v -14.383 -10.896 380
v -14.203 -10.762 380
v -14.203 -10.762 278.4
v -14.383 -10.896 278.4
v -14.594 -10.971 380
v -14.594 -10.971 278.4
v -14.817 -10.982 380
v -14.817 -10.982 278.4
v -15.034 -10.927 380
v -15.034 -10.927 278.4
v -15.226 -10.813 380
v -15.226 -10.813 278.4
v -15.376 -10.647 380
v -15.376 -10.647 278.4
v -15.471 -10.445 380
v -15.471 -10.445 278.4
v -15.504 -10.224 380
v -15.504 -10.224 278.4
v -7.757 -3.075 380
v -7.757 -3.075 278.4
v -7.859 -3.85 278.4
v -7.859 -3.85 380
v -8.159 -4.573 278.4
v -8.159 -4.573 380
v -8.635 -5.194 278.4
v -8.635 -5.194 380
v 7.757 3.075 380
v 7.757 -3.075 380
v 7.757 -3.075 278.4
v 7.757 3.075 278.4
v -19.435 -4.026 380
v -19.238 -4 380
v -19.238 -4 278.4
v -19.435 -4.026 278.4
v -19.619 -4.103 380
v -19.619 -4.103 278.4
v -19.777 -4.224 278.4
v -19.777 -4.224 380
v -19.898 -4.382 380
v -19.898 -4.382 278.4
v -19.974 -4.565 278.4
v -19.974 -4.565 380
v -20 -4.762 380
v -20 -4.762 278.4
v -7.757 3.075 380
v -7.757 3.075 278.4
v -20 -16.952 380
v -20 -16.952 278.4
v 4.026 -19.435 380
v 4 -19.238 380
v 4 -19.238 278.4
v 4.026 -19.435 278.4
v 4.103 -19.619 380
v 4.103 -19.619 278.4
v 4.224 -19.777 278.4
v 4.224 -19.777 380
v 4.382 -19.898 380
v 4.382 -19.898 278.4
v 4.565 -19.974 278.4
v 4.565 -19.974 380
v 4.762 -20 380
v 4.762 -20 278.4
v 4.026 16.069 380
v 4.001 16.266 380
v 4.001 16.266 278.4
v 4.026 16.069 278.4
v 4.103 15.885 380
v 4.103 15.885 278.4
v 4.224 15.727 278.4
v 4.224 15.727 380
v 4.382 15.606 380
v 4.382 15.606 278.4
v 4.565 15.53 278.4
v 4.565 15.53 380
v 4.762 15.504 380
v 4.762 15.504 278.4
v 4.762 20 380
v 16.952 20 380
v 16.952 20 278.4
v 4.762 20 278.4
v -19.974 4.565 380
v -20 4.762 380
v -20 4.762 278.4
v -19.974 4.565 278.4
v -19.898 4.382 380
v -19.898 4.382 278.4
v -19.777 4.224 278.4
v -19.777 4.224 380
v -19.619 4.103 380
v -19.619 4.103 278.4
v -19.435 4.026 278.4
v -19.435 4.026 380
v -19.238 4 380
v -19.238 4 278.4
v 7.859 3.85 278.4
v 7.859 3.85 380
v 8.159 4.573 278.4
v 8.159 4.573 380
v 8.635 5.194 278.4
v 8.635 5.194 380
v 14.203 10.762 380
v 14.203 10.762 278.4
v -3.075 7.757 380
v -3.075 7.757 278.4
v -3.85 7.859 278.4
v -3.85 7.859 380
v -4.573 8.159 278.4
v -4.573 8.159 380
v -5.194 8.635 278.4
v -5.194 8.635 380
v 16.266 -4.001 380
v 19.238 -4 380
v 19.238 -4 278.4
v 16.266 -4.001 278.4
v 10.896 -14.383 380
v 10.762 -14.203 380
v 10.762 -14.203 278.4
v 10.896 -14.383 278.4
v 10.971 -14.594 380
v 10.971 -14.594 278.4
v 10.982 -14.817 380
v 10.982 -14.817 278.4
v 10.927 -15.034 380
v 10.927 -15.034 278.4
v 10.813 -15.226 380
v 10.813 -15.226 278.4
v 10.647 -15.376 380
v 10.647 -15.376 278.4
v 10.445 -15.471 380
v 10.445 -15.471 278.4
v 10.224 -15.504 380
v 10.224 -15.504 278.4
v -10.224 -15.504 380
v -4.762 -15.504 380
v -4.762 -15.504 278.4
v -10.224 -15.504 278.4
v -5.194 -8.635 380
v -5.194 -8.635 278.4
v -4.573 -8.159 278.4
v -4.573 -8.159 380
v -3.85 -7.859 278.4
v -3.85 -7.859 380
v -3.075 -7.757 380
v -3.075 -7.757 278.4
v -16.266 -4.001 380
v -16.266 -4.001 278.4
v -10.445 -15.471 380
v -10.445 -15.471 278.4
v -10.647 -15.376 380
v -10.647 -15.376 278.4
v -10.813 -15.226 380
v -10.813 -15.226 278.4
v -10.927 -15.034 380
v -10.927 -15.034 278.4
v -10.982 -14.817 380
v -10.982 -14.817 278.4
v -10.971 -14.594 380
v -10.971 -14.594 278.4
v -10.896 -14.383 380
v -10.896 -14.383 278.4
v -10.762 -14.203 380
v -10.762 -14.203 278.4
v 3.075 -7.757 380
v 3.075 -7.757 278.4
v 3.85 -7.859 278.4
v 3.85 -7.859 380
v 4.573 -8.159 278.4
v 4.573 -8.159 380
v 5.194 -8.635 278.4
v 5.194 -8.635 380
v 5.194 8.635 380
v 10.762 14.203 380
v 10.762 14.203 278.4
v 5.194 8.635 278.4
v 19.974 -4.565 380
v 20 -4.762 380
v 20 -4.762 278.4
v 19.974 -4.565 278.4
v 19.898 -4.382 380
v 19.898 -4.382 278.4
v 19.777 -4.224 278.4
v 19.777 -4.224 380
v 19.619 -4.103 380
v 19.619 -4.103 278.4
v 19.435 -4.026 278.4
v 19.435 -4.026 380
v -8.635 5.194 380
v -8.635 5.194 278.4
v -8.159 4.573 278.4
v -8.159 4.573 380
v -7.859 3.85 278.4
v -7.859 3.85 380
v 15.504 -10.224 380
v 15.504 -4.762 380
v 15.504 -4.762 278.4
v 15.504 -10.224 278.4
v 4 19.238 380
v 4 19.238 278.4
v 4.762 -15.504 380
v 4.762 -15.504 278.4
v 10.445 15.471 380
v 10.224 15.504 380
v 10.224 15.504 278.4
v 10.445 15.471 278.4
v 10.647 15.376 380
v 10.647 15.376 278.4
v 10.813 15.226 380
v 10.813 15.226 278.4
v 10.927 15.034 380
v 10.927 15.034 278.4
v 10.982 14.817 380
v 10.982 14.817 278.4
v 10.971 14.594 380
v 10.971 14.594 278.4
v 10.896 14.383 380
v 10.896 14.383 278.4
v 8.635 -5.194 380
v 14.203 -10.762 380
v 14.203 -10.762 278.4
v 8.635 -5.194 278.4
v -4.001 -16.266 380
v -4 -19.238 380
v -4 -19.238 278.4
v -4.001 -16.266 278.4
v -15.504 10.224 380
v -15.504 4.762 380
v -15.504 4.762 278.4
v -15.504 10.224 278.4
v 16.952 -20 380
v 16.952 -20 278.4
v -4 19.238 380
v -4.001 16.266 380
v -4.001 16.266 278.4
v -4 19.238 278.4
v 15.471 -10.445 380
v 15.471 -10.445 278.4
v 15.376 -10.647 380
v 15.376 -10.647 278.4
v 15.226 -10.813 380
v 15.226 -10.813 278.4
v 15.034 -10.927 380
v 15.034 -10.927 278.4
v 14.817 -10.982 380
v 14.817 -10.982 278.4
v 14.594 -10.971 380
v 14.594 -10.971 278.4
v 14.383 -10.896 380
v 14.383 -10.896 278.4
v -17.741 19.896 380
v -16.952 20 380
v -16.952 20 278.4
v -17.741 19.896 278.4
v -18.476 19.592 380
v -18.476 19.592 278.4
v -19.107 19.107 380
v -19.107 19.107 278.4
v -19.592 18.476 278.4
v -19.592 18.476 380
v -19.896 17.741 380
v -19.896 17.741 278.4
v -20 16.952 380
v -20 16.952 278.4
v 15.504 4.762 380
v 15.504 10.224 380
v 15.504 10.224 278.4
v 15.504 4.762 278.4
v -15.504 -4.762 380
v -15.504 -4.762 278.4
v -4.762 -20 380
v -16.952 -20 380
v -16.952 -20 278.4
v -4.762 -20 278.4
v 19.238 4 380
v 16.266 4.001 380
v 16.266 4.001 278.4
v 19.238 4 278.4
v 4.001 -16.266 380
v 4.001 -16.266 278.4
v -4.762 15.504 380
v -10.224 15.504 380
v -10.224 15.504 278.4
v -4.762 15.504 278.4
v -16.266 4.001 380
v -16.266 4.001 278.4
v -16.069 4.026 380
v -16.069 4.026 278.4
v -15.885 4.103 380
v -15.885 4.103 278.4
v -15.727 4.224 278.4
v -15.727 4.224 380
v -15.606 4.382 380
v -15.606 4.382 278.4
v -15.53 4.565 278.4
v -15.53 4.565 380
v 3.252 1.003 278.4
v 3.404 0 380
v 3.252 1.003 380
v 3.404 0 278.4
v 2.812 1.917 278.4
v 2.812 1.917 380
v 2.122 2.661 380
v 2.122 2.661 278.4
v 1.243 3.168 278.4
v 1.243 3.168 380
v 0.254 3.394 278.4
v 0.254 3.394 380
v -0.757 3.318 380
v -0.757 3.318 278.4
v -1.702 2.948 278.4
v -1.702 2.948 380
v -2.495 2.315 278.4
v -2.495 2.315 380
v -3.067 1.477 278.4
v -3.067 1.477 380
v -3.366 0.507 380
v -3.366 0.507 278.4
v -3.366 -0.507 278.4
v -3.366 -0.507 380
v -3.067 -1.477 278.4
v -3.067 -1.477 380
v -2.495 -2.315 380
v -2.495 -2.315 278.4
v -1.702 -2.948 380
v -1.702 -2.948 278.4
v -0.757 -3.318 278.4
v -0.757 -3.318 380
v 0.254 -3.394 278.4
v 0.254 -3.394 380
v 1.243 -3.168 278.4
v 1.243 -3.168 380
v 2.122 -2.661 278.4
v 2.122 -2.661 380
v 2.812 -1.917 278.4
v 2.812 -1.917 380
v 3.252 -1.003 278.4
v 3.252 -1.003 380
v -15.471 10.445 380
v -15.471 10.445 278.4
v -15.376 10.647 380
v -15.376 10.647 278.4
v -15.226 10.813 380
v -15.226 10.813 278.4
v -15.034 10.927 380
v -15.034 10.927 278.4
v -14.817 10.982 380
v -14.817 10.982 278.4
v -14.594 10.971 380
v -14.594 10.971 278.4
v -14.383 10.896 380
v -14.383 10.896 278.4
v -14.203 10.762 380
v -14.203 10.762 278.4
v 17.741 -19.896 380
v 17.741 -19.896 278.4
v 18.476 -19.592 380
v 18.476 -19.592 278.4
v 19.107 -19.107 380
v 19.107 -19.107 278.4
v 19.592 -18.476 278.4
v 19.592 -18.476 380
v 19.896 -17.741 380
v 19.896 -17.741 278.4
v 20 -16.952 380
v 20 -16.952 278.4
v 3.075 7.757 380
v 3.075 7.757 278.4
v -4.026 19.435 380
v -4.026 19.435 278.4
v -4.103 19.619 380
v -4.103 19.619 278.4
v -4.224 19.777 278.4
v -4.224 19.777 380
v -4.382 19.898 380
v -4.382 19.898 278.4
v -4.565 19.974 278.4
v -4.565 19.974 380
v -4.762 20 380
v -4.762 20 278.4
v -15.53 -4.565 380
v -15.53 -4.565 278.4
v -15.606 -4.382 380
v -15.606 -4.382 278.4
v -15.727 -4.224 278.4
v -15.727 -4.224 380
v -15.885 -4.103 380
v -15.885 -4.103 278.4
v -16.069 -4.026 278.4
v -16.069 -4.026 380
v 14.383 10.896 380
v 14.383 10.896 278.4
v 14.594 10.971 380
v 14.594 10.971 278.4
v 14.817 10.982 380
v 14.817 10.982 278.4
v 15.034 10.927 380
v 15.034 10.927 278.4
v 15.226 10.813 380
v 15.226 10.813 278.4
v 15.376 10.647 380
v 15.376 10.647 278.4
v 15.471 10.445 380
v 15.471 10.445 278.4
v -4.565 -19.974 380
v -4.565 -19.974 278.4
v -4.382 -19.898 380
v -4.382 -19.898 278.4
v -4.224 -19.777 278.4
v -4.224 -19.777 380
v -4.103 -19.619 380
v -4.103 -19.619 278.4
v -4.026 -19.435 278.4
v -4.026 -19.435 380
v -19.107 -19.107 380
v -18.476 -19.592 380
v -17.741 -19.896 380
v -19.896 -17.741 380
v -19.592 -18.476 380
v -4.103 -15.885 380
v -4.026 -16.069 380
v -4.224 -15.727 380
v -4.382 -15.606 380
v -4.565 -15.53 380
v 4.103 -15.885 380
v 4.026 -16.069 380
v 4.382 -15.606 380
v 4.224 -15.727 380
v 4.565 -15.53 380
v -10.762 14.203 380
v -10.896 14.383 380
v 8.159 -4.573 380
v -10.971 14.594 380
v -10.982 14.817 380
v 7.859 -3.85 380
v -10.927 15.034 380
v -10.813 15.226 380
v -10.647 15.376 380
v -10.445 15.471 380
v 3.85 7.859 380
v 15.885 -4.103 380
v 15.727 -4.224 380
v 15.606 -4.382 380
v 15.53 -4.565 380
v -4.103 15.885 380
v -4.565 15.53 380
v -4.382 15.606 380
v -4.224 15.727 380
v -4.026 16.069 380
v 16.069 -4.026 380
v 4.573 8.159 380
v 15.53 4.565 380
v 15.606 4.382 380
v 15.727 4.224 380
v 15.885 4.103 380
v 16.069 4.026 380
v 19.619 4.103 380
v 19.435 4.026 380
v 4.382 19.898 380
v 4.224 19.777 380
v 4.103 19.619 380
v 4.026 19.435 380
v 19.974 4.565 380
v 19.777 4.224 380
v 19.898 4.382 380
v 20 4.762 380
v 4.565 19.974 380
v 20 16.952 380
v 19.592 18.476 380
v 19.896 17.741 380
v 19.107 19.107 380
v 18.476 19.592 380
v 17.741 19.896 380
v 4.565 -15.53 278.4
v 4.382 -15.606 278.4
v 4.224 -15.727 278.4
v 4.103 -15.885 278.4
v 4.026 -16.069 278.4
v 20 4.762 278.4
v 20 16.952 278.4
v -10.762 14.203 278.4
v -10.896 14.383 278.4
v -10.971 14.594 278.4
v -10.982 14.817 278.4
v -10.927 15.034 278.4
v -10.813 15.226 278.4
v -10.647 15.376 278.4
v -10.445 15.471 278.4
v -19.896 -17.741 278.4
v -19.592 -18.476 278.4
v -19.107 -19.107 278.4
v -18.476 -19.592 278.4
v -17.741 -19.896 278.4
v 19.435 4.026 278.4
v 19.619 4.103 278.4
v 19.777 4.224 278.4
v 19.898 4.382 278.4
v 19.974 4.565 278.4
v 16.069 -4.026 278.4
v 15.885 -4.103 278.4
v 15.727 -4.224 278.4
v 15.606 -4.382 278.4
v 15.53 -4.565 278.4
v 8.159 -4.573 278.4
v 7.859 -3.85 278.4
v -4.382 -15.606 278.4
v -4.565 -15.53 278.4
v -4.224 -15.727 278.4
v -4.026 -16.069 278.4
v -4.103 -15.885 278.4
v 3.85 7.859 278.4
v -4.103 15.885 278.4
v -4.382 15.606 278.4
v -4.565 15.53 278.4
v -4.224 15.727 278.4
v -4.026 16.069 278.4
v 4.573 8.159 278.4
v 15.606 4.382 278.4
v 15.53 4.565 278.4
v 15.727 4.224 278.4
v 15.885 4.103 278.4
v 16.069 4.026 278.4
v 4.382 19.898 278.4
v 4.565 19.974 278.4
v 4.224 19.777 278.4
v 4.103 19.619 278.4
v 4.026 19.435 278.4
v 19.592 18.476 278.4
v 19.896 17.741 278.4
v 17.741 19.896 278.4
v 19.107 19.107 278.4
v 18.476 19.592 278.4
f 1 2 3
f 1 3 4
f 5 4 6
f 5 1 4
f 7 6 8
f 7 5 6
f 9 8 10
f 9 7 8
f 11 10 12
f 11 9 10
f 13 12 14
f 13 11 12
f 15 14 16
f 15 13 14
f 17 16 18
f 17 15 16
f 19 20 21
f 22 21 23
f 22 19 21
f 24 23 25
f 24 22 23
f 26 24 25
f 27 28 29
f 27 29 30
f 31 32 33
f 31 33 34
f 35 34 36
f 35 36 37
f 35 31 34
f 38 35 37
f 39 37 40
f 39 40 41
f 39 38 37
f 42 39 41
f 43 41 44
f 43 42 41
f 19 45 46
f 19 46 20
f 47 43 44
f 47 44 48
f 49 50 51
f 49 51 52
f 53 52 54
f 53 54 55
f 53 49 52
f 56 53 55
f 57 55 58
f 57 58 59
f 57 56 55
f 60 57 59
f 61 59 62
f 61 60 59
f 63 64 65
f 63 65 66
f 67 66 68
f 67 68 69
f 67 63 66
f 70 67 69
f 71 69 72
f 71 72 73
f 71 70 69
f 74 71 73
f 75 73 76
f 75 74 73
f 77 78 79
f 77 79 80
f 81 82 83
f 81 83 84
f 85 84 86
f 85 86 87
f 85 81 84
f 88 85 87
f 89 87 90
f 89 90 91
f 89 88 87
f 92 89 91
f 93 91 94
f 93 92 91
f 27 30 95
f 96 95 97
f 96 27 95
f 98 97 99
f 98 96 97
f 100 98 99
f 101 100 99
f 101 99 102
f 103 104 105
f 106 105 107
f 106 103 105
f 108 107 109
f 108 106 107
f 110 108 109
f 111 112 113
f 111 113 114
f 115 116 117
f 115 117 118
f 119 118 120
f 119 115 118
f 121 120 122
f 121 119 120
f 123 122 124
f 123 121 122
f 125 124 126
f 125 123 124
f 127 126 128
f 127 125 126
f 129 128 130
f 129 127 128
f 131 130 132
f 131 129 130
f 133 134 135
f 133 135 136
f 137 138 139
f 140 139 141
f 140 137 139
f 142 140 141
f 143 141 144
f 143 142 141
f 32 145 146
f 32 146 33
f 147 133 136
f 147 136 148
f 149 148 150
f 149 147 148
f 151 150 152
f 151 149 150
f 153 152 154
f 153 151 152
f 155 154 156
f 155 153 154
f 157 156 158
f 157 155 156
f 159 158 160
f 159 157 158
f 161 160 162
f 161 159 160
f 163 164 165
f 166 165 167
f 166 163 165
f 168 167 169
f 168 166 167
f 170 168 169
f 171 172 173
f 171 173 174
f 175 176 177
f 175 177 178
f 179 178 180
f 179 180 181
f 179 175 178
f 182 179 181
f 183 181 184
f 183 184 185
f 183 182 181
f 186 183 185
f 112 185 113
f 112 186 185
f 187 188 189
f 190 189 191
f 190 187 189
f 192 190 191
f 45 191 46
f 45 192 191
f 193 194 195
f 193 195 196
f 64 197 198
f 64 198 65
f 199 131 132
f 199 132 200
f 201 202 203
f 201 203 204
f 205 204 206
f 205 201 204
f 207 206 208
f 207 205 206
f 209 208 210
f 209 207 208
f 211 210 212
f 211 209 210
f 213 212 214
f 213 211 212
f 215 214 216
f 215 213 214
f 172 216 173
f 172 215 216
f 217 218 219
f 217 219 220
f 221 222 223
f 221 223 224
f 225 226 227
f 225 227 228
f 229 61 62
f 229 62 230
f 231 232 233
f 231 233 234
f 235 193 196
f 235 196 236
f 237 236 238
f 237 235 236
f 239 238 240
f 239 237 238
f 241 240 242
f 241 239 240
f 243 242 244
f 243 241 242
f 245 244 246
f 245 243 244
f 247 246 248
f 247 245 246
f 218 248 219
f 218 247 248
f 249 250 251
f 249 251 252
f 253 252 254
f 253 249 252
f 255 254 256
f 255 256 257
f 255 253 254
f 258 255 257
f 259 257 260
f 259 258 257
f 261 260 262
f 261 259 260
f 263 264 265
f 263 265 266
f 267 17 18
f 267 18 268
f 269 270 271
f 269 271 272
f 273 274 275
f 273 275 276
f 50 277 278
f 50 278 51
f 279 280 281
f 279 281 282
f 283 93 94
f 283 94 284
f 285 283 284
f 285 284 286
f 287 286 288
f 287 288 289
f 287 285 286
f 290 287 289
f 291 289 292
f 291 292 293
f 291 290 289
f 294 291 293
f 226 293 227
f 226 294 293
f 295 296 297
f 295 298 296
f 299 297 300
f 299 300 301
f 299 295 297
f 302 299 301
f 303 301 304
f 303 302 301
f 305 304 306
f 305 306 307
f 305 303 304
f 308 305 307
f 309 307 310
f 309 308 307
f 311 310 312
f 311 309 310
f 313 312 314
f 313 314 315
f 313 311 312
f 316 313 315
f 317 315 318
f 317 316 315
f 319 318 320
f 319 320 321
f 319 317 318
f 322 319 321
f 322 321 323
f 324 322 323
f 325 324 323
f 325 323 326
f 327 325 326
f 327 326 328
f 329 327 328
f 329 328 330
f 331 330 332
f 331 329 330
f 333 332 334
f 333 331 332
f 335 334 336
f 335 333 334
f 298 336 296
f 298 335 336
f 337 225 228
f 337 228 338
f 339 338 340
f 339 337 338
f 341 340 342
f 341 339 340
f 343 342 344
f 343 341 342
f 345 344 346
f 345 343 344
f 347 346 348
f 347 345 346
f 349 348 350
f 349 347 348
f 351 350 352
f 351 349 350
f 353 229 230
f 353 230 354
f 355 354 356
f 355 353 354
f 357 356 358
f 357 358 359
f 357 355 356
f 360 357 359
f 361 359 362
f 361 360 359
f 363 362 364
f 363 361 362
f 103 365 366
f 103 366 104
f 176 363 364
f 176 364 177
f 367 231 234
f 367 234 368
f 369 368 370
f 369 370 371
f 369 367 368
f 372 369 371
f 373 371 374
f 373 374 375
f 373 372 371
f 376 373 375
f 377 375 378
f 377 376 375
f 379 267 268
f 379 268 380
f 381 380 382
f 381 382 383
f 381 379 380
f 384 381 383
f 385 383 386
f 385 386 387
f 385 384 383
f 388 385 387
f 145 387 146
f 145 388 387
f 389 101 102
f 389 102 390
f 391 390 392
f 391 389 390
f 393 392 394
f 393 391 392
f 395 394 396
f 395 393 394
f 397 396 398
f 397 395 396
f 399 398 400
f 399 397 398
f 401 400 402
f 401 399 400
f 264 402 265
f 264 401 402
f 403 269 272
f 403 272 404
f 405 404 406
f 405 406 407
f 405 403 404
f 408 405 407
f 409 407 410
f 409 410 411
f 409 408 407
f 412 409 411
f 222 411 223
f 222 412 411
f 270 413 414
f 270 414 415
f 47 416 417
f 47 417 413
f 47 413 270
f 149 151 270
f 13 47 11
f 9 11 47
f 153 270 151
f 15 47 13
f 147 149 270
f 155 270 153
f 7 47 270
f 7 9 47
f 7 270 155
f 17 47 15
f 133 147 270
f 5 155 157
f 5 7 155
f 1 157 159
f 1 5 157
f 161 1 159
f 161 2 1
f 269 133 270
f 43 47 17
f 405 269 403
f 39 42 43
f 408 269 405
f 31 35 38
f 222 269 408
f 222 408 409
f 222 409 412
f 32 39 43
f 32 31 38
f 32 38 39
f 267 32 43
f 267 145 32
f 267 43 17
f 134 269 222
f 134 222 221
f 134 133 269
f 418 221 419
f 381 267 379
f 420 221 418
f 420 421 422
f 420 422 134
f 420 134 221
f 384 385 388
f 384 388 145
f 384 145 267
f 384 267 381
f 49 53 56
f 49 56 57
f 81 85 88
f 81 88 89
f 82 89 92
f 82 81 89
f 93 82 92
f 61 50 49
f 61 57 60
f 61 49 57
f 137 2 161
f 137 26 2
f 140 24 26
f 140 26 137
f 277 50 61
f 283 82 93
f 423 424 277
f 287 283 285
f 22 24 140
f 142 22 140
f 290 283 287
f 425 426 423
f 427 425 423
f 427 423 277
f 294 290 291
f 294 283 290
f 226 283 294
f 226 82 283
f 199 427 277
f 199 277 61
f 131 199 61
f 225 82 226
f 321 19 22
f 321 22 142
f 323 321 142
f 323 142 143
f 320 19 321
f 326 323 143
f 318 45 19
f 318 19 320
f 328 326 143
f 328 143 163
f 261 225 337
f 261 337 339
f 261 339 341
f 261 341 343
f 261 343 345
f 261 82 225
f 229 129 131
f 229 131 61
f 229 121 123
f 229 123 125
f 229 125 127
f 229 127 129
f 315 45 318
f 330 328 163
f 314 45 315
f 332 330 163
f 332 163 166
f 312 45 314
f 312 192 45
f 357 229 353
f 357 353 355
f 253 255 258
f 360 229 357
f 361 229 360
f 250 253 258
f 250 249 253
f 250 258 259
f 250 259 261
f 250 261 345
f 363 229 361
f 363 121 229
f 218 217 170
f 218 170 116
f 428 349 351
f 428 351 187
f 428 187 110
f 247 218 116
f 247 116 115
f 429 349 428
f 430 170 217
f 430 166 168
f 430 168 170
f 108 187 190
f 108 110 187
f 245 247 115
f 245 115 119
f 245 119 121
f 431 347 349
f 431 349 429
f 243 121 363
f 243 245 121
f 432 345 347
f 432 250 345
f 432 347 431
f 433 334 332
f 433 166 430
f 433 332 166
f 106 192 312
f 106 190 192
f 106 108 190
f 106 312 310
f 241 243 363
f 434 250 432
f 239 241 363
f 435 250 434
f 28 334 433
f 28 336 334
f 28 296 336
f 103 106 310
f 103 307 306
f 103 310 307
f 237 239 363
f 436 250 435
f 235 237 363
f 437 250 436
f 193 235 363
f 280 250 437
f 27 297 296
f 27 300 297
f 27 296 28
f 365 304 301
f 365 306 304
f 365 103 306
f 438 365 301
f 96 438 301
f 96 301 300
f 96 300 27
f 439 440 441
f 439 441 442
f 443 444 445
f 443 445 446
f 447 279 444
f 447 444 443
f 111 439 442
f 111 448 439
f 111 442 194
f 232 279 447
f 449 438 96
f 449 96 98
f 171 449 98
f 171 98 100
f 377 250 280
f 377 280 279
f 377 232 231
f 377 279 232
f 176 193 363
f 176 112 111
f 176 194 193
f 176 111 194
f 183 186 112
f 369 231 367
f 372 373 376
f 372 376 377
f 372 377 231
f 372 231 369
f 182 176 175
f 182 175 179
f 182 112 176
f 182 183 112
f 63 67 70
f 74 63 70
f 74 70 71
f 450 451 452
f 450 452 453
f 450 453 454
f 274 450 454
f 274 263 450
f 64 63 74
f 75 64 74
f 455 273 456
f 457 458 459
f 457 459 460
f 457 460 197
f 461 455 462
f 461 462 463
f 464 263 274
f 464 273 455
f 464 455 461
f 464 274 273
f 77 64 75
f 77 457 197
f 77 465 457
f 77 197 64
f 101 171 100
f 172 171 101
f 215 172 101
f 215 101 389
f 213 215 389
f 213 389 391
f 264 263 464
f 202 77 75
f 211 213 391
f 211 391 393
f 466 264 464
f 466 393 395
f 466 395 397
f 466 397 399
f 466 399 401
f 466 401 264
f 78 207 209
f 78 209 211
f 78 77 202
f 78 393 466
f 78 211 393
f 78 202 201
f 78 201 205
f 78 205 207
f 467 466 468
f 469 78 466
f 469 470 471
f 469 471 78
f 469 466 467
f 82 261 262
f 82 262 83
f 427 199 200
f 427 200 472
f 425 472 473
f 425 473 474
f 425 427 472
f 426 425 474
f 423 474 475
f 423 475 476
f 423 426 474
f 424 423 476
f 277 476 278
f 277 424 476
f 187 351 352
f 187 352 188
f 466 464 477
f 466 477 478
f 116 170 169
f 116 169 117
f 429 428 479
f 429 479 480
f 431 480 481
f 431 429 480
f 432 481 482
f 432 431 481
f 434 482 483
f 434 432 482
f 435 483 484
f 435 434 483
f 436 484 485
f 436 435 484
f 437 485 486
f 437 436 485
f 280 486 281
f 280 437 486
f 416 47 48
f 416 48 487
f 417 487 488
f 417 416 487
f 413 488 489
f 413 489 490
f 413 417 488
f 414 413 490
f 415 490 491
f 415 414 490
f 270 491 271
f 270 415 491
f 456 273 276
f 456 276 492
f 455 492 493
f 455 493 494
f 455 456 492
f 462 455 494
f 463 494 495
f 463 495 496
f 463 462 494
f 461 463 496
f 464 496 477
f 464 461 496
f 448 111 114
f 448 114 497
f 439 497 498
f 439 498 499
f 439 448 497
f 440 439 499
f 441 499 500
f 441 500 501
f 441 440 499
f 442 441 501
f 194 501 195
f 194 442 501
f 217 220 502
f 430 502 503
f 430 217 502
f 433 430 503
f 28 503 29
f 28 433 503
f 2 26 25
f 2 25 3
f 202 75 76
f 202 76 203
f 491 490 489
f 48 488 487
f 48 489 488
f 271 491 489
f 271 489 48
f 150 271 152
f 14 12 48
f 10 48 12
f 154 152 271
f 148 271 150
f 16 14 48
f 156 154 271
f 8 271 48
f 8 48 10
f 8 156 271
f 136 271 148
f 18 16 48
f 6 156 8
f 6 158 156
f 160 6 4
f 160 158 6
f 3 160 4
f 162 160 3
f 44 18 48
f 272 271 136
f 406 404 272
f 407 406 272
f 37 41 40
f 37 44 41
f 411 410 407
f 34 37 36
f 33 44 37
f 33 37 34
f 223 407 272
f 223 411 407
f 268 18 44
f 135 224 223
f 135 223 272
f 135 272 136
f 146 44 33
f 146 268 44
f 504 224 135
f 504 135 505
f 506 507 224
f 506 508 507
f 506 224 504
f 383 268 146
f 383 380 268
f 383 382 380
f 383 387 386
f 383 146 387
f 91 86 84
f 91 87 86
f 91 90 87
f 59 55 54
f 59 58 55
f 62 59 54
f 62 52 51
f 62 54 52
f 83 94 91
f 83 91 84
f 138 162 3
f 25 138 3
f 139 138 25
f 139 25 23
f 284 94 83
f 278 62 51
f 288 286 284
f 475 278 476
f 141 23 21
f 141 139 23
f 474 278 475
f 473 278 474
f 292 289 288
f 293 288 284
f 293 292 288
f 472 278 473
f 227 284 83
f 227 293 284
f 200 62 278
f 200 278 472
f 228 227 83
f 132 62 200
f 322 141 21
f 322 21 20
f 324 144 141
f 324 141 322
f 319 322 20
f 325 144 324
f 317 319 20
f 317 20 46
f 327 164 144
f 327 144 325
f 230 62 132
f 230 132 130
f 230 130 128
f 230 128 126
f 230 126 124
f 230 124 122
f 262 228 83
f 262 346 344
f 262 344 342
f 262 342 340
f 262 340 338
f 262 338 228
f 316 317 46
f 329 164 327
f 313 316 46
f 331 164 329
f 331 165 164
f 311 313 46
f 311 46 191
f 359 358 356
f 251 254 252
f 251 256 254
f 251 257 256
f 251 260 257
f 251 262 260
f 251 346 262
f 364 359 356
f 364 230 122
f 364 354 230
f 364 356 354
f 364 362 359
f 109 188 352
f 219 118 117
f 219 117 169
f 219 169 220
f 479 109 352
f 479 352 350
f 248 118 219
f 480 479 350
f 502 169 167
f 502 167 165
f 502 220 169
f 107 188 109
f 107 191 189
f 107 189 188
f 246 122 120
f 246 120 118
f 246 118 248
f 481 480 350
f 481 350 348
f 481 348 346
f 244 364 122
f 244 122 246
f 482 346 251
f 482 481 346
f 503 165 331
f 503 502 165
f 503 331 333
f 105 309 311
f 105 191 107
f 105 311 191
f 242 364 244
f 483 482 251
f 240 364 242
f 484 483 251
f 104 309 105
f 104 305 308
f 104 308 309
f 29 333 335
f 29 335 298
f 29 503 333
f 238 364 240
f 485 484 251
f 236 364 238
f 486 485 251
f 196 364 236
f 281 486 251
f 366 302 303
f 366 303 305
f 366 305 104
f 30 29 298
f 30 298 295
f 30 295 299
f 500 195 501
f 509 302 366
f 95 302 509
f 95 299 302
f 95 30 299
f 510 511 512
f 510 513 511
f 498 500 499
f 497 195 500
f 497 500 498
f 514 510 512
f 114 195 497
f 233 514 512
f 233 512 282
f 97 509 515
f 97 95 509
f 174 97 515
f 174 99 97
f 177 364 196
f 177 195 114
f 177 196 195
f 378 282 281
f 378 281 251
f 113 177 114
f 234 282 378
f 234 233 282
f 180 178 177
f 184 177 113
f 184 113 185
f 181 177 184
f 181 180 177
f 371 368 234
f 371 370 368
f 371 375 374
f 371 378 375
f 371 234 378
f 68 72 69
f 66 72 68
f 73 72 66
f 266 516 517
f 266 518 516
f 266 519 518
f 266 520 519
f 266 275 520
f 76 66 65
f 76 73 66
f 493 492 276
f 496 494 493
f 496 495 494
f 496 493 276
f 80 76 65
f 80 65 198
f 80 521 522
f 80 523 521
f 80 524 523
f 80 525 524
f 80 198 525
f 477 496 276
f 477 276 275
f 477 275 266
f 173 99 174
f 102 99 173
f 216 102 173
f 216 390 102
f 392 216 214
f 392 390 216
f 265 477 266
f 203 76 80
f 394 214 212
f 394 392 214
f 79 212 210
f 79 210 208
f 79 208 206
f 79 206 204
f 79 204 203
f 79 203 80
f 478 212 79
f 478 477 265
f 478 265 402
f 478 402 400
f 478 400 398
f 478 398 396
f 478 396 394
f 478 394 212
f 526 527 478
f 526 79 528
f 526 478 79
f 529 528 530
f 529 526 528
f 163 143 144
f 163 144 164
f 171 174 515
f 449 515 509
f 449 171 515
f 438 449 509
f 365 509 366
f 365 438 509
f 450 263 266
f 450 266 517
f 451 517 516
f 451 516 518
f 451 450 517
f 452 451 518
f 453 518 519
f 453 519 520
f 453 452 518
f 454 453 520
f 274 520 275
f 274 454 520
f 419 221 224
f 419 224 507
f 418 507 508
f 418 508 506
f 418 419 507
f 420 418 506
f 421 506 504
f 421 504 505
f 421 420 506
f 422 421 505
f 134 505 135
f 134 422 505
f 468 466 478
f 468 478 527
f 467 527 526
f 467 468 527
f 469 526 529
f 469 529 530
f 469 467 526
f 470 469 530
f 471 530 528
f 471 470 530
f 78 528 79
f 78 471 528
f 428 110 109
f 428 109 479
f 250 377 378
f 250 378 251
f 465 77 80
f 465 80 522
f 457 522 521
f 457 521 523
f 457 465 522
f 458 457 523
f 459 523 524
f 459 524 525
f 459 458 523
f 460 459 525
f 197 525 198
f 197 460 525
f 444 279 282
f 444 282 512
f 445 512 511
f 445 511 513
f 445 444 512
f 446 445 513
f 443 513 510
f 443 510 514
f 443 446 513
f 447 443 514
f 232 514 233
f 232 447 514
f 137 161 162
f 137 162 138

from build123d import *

# Parameters (mm, degrees)
SKETCH1_R               = 3.4036
BOSS_EXTRUDE1_DEPTH     = 380
SKETCH2_W               = 379
SKETCH2_H               = 40
CUT_EXTRUDE1_DEPTH      = 65
CUT_EXTRUDE1_DEPTH_BACK = 71
SKETCH4_W               = 279.4
SKETCH4_H               = 55.537742005
CUT_EXTRUDE2_DEPTH      = 30
CUT_EXTRUDE2_DEPTH_BACK = 30


with BuildPart() as part:
    # Sketch1 → Boss-Extrude1 (new body, symmetric)
    with BuildSketch(Plane.XY):
        with BuildLine():
            Line((-20, 16.952), (-20, 4.7625))
            ThreePointArc((-20, 4.7625), (-19.776815367, 4.223684633), (-19.238, 4.0005))
            Line((-19.238, 4.0005), (-16.2662, 4.0005))
            ThreePointArc((-16.2662, 4.0005), (-15.727384633, 4.223684633), (-15.5042, 4.7625))
            Line((-15.5042, 4.7625), (-15.5042, 10.2235))
            ThreePointArc((-15.5042, 10.2235), (-15.033804775, 10.927496204), (-14.203384633, 10.762315367))
            Line((-14.203384633, 10.762315367), (-8.635059555, 5.19399029))
            ThreePointArc((-8.635059555, 5.19399029), (-7.985348265, 4.221628629), (-7.7572, 3.074649845))
            Line((-7.7572, 3.074649845), (-7.7572, -3.074649845))
            ThreePointArc((-7.7572, -3.074649845), (-7.985348265, -4.221628629), (-8.635059555, -5.19399029))
            Line((-8.635059555, -5.19399029), (-14.203384633, -10.762315367))
            ThreePointArc((-14.203384633, -10.762315367), (-15.033804775, -10.927496204), (-15.5042, -10.2235))
            Line((-15.5042, -10.2235), (-15.5042, -4.7625))
            ThreePointArc((-15.5042, -4.7625), (-15.727384633, -4.223684633), (-16.2662, -4.0005))
            Line((-16.2662, -4.0005), (-19.238, -4.0005))
            ThreePointArc((-19.238, -4.0005), (-19.776815367, -4.223684633), (-20, -4.7625))
            Line((-20, -4.7625), (-20, -16.952))
            ThreePointArc((-20, -16.952), (-19.107261469, -19.107261469), (-16.952, -20))
            Line((-16.952, -20), (-4.7625, -20))
            ThreePointArc((-4.7625, -20), (-4.223684633, -19.776815367), (-4.0005, -19.238))
            Line((-4.0005, -19.238), (-4.0005, -16.2662))
            ThreePointArc((-4.0005, -16.2662), (-4.223684633, -15.727384633), (-4.7625, -15.5042))
            Line((-4.7625, -15.5042), (-10.2235, -15.5042))
            ThreePointArc((-10.2235, -15.5042), (-10.927496204, -15.033804775), (-10.762315367, -14.203384633))
            Line((-10.762315367, -14.203384633), (-5.19399029, -8.635059555))
            ThreePointArc((-5.19399029, -8.635059555), (-4.221628629, -7.985348265), (-3.074649845, -7.7572))
            Line((-3.074649845, -7.7572), (3.074649845, -7.7572))
            ThreePointArc((3.074649845, -7.7572), (4.221628629, -7.985348265), (5.19399029, -8.635059555))
            Line((5.19399029, -8.635059555), (10.762315367, -14.203384633))
            ThreePointArc((10.762315367, -14.203384633), (10.927496204, -15.033804775), (10.2235, -15.5042))
            Line((10.2235, -15.5042), (4.7625, -15.5042))
            ThreePointArc((4.7625, -15.5042), (4.223684633, -15.727384633), (4.0005, -16.2662))
            Line((4.0005, -16.2662), (4.0005, -19.238))
            ThreePointArc((4.0005, -19.238), (4.223684633, -19.776815367), (4.7625, -20))
            Line((4.7625, -20), (16.952, -20))
            ThreePointArc((16.952, -20), (19.107261469, -19.107261469), (20, -16.952))
            Line((20, -16.952), (20, -4.7625))
            ThreePointArc((20, -4.7625), (19.776815367, -4.223684633), (19.238, -4.0005))
            Line((19.238, -4.0005), (16.2662, -4.0005))
            ThreePointArc((16.2662, -4.0005), (15.727384633, -4.223684633), (15.5042, -4.7625))
            Line((15.5042, -4.7625), (15.5042, -10.2235))
            ThreePointArc((15.5042, -10.2235), (15.033804775, -10.927496204), (14.203384633, -10.762315367))
            Line((14.203384633, -10.762315367), (8.635059555, -5.19399029))
            ThreePointArc((8.635059555, -5.19399029), (7.985348265, -4.221628629), (7.7572, -3.074649845))
            Line((7.7572, -3.074649845), (7.7572, 3.074649845))
            ThreePointArc((7.7572, 3.074649845), (7.985348265, 4.221628629), (8.635059555, 5.19399029))
            Line((8.635059555, 5.19399029), (14.203384633, 10.762315367))
            ThreePointArc((14.203384633, 10.762315367), (15.033804775, 10.927496204), (15.5042, 10.2235))
            Line((15.5042, 10.2235), (15.5042, 4.7625))
            ThreePointArc((15.5042, 4.7625), (15.727384633, 4.223684633), (16.2662, 4.0005))
            Line((16.2662, 4.0005), (19.238, 4.0005))
            ThreePointArc((19.238, 4.0005), (19.776815367, 4.223684633), (20, 4.7625))
            Line((20, 4.7625), (20, 16.952))
            ThreePointArc((20, 16.952), (19.107261469, 19.107261469), (16.952, 20))
            Line((16.952, 20), (4.7625, 20))
            ThreePointArc((4.7625, 20), (4.223684633, 19.776815367), (4.0005, 19.238))
            Line((4.0005, 19.238), (4.0005, 16.2662))
            ThreePointArc((4.0005, 16.2662), (4.223684633, 15.727384633), (4.7625, 15.5042))
            Line((4.7625, 15.5042), (10.2235, 15.5042))
            ThreePointArc((10.2235, 15.5042), (10.927496204, 15.033804775), (10.762315367, 14.203384633))
            Line((10.762315367, 14.203384633), (5.19399029, 8.635059555))
            ThreePointArc((5.19399029, 8.635059555), (4.221628629, 7.985348265), (3.074649845, 7.7572))
            Line((3.074649845, 7.7572), (-3.074649845, 7.7572))
            ThreePointArc((-3.074649845, 7.7572), (-4.221628629, 7.985348265), (-5.19399029, 8.635059555))
            Line((-5.19399029, 8.635059555), (-10.762315367, 14.203384633))
            ThreePointArc((-10.762315367, 14.203384633), (-10.927496204, 15.033804775), (-10.2235, 15.5042))
            Line((-10.2235, 15.5042), (-4.7625, 15.5042))
            ThreePointArc((-4.7625, 15.5042), (-4.223684633, 15.727384633), (-4.0005, 16.2662))
            Line((-4.0005, 16.2662), (-4.0005, 19.238))
            ThreePointArc((-4.0005, 19.238), (-4.223684633, 19.776815367), (-4.7625, 20))
            Line((-4.7625, 20), (-16.952, 20))
            ThreePointArc((-16.952, 20), (-19.107261469, 19.107261469), (-20, 16.952))
        make_face()
        Circle(SKETCH1_R, mode=Mode.SUBTRACT)
    extrude(amount=BOSS_EXTRUDE1_DEPTH, both=True)

    # Sketch2 → Cut-Extrude1 (cut, two sides)
    with BuildSketch(Plane(origin=(0, 0, 0), x_dir=(0, 0, -1), z_dir=(1, 0, 0))) as cut_extrude1_sk:
        with Locations((190.5, 0)):
            Rectangle(SKETCH2_W, SKETCH2_H)
    extrude(amount=CUT_EXTRUDE1_DEPTH, mode=Mode.SUBTRACT)
    extrude(cut_extrude1_sk.sketch, amount=-CUT_EXTRUDE1_DEPTH_BACK, mode=Mode.SUBTRACT)

    # Sketch4 → Cut-Extrude2 (cut, two sides)
    with BuildSketch(Plane(origin=(0, 0, 0), x_dir=(0, 0, -1), z_dir=(1, 0, 0))) as cut_extrude2_sk:
        with Locations((-138.7, -7.768871003)):
            Rectangle(SKETCH4_W, SKETCH4_H)
    extrude(amount=CUT_EXTRUDE2_DEPTH, mode=Mode.SUBTRACT)
    extrude(cut_extrude2_sk.sketch, amount=-CUT_EXTRUDE2_DEPTH_BACK, mode=Mode.SUBTRACT)


solid = part.part
